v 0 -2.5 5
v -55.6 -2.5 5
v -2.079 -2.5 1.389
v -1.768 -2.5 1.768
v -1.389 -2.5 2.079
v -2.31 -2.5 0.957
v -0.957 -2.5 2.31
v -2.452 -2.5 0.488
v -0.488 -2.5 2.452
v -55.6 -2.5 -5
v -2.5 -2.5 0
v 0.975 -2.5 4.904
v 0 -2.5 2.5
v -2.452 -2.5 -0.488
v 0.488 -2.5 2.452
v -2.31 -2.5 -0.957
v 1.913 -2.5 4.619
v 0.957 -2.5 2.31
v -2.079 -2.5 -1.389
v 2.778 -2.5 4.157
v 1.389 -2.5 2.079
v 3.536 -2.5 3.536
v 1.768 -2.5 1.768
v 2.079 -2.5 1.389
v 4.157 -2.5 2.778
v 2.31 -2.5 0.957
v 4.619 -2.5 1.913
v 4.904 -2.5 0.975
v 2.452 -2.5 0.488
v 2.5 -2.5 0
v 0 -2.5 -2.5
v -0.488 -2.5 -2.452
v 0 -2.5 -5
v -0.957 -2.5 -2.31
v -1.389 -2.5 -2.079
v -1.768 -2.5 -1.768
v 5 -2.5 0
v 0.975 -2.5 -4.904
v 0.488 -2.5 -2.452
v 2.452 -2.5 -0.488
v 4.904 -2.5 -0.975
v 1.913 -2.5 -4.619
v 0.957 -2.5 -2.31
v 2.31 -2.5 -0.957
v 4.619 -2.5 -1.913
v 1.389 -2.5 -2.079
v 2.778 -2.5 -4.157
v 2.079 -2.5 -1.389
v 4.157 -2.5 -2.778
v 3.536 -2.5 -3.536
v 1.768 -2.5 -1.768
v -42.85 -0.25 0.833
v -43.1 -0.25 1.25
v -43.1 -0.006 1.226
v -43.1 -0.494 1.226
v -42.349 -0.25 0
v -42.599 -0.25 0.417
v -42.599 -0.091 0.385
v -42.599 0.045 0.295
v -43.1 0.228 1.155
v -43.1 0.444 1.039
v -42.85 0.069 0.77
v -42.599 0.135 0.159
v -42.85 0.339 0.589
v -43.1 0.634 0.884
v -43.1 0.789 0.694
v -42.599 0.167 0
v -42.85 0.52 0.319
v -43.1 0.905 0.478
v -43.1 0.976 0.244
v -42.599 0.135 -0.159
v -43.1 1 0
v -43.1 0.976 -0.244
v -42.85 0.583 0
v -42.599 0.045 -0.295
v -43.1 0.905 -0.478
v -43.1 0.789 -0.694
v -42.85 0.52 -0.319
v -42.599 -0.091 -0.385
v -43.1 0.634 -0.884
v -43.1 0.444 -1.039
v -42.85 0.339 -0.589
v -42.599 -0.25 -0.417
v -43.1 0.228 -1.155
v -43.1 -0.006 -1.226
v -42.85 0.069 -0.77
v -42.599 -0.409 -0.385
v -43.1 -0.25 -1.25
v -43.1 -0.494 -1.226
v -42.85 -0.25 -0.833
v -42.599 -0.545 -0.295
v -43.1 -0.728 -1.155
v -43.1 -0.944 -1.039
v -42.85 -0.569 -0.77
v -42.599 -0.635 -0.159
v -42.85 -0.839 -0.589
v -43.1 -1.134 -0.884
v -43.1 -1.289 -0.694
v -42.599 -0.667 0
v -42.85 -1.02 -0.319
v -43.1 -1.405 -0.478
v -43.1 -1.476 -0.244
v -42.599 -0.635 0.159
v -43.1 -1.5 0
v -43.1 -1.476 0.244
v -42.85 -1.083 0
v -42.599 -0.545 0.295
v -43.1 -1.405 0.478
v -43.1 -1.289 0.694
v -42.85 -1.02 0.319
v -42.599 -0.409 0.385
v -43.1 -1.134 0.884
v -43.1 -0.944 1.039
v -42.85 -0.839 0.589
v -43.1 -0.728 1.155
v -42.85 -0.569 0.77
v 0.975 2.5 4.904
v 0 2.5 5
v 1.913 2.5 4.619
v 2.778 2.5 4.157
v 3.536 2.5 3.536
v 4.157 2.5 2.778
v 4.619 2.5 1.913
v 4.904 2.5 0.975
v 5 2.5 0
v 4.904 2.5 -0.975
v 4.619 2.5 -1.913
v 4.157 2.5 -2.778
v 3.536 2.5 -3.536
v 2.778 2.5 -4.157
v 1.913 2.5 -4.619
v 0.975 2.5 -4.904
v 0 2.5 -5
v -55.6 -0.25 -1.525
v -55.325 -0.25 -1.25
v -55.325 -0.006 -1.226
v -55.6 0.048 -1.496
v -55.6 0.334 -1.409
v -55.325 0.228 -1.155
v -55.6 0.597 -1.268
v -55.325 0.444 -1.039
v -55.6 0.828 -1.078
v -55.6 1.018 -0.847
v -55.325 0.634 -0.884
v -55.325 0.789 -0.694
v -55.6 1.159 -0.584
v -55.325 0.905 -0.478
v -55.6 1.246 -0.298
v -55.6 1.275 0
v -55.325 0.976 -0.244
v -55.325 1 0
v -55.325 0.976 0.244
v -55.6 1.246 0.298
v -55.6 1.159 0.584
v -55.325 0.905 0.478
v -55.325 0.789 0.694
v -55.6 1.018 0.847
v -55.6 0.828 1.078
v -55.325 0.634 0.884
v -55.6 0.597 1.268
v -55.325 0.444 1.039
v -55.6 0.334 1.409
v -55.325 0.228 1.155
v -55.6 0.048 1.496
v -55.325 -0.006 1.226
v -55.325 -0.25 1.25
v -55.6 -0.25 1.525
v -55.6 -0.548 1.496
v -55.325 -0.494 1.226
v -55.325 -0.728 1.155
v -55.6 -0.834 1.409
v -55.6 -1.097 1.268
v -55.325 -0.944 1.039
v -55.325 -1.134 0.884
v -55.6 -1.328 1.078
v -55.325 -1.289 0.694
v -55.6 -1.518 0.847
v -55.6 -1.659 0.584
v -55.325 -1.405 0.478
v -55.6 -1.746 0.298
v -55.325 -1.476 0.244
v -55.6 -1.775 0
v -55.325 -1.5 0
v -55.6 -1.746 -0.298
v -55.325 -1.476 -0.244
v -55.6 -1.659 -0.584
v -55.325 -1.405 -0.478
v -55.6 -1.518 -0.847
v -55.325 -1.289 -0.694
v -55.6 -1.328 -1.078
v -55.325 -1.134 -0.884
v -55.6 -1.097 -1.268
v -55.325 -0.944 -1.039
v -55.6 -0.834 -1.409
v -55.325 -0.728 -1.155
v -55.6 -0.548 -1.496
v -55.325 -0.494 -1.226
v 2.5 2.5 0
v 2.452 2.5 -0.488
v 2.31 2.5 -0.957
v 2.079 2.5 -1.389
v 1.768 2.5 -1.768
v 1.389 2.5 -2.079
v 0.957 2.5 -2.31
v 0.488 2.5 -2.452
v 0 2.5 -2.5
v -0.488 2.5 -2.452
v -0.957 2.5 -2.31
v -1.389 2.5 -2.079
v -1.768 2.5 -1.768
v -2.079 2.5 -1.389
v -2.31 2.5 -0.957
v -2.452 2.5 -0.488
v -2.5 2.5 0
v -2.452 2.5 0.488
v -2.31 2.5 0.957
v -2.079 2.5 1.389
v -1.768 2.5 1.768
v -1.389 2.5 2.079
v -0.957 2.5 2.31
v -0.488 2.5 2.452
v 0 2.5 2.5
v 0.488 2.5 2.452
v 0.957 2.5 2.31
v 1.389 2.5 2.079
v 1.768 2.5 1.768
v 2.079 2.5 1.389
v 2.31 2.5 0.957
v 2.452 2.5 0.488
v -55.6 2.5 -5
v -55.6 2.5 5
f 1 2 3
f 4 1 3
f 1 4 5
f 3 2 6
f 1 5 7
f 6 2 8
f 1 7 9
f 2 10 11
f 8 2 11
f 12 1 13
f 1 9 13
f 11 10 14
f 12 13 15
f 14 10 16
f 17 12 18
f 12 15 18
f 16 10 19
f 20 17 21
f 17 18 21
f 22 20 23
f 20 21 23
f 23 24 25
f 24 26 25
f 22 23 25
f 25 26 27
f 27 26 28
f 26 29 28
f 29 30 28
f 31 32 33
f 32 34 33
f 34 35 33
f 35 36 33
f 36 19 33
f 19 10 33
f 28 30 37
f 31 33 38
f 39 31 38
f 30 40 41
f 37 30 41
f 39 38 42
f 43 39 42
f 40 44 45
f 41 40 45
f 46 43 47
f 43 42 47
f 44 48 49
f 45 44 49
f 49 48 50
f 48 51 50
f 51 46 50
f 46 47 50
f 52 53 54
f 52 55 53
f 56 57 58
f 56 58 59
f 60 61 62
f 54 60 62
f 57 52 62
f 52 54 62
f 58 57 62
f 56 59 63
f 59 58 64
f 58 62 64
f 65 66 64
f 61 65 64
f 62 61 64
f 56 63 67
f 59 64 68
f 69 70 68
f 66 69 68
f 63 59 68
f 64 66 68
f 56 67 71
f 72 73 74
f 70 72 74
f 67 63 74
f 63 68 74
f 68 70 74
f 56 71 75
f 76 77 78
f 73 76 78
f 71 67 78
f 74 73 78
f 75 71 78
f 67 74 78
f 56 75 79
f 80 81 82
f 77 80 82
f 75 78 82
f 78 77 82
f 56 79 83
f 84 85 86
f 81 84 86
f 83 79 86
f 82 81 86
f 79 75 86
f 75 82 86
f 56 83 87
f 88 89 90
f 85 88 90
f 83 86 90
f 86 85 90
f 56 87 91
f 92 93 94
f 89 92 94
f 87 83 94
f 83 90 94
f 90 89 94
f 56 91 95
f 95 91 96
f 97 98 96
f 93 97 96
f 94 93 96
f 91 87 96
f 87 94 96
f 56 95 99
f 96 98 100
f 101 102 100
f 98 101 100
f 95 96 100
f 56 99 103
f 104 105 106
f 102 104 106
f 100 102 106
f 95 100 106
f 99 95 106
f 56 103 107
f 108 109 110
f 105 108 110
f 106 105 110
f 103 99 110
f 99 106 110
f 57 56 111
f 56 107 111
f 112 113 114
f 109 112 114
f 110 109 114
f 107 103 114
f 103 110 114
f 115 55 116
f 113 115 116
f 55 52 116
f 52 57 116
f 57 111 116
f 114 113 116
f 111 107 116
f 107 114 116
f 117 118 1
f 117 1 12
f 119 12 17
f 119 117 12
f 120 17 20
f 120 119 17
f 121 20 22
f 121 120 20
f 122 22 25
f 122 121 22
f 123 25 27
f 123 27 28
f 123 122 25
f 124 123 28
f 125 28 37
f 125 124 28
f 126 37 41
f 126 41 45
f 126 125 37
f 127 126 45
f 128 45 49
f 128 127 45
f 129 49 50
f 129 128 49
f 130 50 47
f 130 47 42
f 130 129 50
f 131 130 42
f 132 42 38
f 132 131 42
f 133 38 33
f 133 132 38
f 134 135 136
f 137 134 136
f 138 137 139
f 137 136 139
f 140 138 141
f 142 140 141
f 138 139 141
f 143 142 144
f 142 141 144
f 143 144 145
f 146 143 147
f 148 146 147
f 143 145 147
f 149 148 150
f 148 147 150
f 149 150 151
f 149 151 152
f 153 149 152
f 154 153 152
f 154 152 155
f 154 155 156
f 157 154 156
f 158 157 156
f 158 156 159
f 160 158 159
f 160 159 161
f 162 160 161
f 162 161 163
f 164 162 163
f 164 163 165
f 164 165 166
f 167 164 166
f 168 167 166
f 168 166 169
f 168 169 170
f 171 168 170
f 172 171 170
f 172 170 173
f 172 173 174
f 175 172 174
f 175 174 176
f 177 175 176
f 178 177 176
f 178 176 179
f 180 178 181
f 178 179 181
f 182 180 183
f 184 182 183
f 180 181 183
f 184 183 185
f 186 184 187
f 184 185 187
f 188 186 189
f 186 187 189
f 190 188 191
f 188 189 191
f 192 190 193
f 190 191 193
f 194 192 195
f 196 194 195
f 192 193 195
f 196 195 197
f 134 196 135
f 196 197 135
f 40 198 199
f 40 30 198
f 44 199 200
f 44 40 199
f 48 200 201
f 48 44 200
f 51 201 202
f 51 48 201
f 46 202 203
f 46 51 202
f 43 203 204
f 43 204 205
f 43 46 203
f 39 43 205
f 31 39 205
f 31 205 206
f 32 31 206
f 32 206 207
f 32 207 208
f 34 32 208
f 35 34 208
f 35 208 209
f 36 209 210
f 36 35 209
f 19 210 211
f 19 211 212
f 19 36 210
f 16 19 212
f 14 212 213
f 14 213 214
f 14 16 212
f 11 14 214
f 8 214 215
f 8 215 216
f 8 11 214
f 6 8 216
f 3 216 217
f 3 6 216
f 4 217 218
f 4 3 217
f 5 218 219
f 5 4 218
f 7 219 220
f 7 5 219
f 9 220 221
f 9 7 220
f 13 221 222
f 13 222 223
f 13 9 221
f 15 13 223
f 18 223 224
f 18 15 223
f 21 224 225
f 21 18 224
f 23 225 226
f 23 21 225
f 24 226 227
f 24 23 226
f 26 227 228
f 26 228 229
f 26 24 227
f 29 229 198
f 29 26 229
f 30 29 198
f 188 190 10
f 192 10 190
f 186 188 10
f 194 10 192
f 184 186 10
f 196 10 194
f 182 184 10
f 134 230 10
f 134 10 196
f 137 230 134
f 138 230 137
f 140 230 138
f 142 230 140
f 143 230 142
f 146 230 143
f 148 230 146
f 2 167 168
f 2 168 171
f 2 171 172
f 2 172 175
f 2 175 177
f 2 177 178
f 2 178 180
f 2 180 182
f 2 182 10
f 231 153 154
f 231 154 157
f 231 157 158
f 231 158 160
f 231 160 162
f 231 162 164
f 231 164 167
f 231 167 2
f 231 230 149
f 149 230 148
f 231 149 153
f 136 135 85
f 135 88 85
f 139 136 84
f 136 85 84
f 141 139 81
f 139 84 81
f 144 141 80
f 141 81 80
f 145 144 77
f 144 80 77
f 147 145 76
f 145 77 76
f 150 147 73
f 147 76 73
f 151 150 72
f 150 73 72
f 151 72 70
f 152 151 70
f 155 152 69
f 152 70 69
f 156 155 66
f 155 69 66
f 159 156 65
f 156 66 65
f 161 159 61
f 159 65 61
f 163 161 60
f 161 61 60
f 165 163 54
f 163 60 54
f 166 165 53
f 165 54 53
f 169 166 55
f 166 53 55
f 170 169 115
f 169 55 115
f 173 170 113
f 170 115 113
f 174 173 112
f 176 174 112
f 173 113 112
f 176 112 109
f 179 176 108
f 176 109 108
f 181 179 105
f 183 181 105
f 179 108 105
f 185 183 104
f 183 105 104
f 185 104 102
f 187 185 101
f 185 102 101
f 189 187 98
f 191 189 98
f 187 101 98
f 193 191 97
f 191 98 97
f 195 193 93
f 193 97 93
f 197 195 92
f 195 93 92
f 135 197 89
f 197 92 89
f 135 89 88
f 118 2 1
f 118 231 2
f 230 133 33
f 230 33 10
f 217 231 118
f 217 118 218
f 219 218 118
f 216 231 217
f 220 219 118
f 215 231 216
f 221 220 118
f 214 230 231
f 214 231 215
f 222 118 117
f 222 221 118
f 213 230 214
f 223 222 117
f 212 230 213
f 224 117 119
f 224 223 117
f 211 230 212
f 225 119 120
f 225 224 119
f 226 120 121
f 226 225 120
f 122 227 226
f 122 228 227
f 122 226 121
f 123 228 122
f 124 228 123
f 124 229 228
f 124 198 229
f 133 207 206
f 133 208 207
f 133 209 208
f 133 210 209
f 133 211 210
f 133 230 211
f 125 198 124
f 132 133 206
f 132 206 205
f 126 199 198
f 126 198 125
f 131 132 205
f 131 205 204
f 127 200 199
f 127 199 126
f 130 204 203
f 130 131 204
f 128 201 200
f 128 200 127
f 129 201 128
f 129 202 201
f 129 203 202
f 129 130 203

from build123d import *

# Parameters (mm, degrees)
ESQUISSE1_R                     = 2.5
BOSS_EXTRU_1_DEPTH              = 2.5
TROU_TARAUD_M3X0_51_D           = 2.5
TROU_TARAUD_M3X0_51_DEPTH       = 12.5
TROU_TARAUD_M3X0_51_CSINK_D     = 3.05
TROU_TARAUD_M3X0_51_CSINK_ANGLE = 90
TROU_TARAUD_M3X0_51_TIP         = 0.751075774


with BuildPart() as part:
    # Esquisse1 → Boss.-Extru.1 (new body, symmetric)
    with BuildSketch(Plane(origin=(0, 0, 0), x_dir=(1, 0, 0), z_dir=(0, 1, 0))):
        with BuildLine():
            Line((-55.6, -5), (0, -5))
            ThreePointArc((0, -5), (5, 0), (0, 5))
            Line((0, 5), (-55.6, 5))
            Line((-55.6, 5), (-55.6, -5))
        make_face()
        Circle(ESQUISSE1_R, mode=Mode.SUBTRACT)
    extrude(amount=BOSS_EXTRU_1_DEPTH, both=True)

    # Trou taraudé M3x0.51
    with Locations(Plane.ZY.offset(55.6)):
        with Locations((0, -0.25)):
            CounterSinkHole(TROU_TARAUD_M3X0_51_D / 2, TROU_TARAUD_M3X0_51_CSINK_D / 2, depth=TROU_TARAUD_M3X0_51_DEPTH, counter_sink_angle=TROU_TARAUD_M3X0_51_CSINK_ANGLE)
            with Locations((0, 0, -(TROU_TARAUD_M3X0_51_DEPTH + TROU_TARAUD_M3X0_51_TIP / 2))):  # 118° drill point
                Cone(0, TROU_TARAUD_M3X0_51_D / 2, TROU_TARAUD_M3X0_51_TIP, mode=Mode.SUBTRACT)


solid = part.part
